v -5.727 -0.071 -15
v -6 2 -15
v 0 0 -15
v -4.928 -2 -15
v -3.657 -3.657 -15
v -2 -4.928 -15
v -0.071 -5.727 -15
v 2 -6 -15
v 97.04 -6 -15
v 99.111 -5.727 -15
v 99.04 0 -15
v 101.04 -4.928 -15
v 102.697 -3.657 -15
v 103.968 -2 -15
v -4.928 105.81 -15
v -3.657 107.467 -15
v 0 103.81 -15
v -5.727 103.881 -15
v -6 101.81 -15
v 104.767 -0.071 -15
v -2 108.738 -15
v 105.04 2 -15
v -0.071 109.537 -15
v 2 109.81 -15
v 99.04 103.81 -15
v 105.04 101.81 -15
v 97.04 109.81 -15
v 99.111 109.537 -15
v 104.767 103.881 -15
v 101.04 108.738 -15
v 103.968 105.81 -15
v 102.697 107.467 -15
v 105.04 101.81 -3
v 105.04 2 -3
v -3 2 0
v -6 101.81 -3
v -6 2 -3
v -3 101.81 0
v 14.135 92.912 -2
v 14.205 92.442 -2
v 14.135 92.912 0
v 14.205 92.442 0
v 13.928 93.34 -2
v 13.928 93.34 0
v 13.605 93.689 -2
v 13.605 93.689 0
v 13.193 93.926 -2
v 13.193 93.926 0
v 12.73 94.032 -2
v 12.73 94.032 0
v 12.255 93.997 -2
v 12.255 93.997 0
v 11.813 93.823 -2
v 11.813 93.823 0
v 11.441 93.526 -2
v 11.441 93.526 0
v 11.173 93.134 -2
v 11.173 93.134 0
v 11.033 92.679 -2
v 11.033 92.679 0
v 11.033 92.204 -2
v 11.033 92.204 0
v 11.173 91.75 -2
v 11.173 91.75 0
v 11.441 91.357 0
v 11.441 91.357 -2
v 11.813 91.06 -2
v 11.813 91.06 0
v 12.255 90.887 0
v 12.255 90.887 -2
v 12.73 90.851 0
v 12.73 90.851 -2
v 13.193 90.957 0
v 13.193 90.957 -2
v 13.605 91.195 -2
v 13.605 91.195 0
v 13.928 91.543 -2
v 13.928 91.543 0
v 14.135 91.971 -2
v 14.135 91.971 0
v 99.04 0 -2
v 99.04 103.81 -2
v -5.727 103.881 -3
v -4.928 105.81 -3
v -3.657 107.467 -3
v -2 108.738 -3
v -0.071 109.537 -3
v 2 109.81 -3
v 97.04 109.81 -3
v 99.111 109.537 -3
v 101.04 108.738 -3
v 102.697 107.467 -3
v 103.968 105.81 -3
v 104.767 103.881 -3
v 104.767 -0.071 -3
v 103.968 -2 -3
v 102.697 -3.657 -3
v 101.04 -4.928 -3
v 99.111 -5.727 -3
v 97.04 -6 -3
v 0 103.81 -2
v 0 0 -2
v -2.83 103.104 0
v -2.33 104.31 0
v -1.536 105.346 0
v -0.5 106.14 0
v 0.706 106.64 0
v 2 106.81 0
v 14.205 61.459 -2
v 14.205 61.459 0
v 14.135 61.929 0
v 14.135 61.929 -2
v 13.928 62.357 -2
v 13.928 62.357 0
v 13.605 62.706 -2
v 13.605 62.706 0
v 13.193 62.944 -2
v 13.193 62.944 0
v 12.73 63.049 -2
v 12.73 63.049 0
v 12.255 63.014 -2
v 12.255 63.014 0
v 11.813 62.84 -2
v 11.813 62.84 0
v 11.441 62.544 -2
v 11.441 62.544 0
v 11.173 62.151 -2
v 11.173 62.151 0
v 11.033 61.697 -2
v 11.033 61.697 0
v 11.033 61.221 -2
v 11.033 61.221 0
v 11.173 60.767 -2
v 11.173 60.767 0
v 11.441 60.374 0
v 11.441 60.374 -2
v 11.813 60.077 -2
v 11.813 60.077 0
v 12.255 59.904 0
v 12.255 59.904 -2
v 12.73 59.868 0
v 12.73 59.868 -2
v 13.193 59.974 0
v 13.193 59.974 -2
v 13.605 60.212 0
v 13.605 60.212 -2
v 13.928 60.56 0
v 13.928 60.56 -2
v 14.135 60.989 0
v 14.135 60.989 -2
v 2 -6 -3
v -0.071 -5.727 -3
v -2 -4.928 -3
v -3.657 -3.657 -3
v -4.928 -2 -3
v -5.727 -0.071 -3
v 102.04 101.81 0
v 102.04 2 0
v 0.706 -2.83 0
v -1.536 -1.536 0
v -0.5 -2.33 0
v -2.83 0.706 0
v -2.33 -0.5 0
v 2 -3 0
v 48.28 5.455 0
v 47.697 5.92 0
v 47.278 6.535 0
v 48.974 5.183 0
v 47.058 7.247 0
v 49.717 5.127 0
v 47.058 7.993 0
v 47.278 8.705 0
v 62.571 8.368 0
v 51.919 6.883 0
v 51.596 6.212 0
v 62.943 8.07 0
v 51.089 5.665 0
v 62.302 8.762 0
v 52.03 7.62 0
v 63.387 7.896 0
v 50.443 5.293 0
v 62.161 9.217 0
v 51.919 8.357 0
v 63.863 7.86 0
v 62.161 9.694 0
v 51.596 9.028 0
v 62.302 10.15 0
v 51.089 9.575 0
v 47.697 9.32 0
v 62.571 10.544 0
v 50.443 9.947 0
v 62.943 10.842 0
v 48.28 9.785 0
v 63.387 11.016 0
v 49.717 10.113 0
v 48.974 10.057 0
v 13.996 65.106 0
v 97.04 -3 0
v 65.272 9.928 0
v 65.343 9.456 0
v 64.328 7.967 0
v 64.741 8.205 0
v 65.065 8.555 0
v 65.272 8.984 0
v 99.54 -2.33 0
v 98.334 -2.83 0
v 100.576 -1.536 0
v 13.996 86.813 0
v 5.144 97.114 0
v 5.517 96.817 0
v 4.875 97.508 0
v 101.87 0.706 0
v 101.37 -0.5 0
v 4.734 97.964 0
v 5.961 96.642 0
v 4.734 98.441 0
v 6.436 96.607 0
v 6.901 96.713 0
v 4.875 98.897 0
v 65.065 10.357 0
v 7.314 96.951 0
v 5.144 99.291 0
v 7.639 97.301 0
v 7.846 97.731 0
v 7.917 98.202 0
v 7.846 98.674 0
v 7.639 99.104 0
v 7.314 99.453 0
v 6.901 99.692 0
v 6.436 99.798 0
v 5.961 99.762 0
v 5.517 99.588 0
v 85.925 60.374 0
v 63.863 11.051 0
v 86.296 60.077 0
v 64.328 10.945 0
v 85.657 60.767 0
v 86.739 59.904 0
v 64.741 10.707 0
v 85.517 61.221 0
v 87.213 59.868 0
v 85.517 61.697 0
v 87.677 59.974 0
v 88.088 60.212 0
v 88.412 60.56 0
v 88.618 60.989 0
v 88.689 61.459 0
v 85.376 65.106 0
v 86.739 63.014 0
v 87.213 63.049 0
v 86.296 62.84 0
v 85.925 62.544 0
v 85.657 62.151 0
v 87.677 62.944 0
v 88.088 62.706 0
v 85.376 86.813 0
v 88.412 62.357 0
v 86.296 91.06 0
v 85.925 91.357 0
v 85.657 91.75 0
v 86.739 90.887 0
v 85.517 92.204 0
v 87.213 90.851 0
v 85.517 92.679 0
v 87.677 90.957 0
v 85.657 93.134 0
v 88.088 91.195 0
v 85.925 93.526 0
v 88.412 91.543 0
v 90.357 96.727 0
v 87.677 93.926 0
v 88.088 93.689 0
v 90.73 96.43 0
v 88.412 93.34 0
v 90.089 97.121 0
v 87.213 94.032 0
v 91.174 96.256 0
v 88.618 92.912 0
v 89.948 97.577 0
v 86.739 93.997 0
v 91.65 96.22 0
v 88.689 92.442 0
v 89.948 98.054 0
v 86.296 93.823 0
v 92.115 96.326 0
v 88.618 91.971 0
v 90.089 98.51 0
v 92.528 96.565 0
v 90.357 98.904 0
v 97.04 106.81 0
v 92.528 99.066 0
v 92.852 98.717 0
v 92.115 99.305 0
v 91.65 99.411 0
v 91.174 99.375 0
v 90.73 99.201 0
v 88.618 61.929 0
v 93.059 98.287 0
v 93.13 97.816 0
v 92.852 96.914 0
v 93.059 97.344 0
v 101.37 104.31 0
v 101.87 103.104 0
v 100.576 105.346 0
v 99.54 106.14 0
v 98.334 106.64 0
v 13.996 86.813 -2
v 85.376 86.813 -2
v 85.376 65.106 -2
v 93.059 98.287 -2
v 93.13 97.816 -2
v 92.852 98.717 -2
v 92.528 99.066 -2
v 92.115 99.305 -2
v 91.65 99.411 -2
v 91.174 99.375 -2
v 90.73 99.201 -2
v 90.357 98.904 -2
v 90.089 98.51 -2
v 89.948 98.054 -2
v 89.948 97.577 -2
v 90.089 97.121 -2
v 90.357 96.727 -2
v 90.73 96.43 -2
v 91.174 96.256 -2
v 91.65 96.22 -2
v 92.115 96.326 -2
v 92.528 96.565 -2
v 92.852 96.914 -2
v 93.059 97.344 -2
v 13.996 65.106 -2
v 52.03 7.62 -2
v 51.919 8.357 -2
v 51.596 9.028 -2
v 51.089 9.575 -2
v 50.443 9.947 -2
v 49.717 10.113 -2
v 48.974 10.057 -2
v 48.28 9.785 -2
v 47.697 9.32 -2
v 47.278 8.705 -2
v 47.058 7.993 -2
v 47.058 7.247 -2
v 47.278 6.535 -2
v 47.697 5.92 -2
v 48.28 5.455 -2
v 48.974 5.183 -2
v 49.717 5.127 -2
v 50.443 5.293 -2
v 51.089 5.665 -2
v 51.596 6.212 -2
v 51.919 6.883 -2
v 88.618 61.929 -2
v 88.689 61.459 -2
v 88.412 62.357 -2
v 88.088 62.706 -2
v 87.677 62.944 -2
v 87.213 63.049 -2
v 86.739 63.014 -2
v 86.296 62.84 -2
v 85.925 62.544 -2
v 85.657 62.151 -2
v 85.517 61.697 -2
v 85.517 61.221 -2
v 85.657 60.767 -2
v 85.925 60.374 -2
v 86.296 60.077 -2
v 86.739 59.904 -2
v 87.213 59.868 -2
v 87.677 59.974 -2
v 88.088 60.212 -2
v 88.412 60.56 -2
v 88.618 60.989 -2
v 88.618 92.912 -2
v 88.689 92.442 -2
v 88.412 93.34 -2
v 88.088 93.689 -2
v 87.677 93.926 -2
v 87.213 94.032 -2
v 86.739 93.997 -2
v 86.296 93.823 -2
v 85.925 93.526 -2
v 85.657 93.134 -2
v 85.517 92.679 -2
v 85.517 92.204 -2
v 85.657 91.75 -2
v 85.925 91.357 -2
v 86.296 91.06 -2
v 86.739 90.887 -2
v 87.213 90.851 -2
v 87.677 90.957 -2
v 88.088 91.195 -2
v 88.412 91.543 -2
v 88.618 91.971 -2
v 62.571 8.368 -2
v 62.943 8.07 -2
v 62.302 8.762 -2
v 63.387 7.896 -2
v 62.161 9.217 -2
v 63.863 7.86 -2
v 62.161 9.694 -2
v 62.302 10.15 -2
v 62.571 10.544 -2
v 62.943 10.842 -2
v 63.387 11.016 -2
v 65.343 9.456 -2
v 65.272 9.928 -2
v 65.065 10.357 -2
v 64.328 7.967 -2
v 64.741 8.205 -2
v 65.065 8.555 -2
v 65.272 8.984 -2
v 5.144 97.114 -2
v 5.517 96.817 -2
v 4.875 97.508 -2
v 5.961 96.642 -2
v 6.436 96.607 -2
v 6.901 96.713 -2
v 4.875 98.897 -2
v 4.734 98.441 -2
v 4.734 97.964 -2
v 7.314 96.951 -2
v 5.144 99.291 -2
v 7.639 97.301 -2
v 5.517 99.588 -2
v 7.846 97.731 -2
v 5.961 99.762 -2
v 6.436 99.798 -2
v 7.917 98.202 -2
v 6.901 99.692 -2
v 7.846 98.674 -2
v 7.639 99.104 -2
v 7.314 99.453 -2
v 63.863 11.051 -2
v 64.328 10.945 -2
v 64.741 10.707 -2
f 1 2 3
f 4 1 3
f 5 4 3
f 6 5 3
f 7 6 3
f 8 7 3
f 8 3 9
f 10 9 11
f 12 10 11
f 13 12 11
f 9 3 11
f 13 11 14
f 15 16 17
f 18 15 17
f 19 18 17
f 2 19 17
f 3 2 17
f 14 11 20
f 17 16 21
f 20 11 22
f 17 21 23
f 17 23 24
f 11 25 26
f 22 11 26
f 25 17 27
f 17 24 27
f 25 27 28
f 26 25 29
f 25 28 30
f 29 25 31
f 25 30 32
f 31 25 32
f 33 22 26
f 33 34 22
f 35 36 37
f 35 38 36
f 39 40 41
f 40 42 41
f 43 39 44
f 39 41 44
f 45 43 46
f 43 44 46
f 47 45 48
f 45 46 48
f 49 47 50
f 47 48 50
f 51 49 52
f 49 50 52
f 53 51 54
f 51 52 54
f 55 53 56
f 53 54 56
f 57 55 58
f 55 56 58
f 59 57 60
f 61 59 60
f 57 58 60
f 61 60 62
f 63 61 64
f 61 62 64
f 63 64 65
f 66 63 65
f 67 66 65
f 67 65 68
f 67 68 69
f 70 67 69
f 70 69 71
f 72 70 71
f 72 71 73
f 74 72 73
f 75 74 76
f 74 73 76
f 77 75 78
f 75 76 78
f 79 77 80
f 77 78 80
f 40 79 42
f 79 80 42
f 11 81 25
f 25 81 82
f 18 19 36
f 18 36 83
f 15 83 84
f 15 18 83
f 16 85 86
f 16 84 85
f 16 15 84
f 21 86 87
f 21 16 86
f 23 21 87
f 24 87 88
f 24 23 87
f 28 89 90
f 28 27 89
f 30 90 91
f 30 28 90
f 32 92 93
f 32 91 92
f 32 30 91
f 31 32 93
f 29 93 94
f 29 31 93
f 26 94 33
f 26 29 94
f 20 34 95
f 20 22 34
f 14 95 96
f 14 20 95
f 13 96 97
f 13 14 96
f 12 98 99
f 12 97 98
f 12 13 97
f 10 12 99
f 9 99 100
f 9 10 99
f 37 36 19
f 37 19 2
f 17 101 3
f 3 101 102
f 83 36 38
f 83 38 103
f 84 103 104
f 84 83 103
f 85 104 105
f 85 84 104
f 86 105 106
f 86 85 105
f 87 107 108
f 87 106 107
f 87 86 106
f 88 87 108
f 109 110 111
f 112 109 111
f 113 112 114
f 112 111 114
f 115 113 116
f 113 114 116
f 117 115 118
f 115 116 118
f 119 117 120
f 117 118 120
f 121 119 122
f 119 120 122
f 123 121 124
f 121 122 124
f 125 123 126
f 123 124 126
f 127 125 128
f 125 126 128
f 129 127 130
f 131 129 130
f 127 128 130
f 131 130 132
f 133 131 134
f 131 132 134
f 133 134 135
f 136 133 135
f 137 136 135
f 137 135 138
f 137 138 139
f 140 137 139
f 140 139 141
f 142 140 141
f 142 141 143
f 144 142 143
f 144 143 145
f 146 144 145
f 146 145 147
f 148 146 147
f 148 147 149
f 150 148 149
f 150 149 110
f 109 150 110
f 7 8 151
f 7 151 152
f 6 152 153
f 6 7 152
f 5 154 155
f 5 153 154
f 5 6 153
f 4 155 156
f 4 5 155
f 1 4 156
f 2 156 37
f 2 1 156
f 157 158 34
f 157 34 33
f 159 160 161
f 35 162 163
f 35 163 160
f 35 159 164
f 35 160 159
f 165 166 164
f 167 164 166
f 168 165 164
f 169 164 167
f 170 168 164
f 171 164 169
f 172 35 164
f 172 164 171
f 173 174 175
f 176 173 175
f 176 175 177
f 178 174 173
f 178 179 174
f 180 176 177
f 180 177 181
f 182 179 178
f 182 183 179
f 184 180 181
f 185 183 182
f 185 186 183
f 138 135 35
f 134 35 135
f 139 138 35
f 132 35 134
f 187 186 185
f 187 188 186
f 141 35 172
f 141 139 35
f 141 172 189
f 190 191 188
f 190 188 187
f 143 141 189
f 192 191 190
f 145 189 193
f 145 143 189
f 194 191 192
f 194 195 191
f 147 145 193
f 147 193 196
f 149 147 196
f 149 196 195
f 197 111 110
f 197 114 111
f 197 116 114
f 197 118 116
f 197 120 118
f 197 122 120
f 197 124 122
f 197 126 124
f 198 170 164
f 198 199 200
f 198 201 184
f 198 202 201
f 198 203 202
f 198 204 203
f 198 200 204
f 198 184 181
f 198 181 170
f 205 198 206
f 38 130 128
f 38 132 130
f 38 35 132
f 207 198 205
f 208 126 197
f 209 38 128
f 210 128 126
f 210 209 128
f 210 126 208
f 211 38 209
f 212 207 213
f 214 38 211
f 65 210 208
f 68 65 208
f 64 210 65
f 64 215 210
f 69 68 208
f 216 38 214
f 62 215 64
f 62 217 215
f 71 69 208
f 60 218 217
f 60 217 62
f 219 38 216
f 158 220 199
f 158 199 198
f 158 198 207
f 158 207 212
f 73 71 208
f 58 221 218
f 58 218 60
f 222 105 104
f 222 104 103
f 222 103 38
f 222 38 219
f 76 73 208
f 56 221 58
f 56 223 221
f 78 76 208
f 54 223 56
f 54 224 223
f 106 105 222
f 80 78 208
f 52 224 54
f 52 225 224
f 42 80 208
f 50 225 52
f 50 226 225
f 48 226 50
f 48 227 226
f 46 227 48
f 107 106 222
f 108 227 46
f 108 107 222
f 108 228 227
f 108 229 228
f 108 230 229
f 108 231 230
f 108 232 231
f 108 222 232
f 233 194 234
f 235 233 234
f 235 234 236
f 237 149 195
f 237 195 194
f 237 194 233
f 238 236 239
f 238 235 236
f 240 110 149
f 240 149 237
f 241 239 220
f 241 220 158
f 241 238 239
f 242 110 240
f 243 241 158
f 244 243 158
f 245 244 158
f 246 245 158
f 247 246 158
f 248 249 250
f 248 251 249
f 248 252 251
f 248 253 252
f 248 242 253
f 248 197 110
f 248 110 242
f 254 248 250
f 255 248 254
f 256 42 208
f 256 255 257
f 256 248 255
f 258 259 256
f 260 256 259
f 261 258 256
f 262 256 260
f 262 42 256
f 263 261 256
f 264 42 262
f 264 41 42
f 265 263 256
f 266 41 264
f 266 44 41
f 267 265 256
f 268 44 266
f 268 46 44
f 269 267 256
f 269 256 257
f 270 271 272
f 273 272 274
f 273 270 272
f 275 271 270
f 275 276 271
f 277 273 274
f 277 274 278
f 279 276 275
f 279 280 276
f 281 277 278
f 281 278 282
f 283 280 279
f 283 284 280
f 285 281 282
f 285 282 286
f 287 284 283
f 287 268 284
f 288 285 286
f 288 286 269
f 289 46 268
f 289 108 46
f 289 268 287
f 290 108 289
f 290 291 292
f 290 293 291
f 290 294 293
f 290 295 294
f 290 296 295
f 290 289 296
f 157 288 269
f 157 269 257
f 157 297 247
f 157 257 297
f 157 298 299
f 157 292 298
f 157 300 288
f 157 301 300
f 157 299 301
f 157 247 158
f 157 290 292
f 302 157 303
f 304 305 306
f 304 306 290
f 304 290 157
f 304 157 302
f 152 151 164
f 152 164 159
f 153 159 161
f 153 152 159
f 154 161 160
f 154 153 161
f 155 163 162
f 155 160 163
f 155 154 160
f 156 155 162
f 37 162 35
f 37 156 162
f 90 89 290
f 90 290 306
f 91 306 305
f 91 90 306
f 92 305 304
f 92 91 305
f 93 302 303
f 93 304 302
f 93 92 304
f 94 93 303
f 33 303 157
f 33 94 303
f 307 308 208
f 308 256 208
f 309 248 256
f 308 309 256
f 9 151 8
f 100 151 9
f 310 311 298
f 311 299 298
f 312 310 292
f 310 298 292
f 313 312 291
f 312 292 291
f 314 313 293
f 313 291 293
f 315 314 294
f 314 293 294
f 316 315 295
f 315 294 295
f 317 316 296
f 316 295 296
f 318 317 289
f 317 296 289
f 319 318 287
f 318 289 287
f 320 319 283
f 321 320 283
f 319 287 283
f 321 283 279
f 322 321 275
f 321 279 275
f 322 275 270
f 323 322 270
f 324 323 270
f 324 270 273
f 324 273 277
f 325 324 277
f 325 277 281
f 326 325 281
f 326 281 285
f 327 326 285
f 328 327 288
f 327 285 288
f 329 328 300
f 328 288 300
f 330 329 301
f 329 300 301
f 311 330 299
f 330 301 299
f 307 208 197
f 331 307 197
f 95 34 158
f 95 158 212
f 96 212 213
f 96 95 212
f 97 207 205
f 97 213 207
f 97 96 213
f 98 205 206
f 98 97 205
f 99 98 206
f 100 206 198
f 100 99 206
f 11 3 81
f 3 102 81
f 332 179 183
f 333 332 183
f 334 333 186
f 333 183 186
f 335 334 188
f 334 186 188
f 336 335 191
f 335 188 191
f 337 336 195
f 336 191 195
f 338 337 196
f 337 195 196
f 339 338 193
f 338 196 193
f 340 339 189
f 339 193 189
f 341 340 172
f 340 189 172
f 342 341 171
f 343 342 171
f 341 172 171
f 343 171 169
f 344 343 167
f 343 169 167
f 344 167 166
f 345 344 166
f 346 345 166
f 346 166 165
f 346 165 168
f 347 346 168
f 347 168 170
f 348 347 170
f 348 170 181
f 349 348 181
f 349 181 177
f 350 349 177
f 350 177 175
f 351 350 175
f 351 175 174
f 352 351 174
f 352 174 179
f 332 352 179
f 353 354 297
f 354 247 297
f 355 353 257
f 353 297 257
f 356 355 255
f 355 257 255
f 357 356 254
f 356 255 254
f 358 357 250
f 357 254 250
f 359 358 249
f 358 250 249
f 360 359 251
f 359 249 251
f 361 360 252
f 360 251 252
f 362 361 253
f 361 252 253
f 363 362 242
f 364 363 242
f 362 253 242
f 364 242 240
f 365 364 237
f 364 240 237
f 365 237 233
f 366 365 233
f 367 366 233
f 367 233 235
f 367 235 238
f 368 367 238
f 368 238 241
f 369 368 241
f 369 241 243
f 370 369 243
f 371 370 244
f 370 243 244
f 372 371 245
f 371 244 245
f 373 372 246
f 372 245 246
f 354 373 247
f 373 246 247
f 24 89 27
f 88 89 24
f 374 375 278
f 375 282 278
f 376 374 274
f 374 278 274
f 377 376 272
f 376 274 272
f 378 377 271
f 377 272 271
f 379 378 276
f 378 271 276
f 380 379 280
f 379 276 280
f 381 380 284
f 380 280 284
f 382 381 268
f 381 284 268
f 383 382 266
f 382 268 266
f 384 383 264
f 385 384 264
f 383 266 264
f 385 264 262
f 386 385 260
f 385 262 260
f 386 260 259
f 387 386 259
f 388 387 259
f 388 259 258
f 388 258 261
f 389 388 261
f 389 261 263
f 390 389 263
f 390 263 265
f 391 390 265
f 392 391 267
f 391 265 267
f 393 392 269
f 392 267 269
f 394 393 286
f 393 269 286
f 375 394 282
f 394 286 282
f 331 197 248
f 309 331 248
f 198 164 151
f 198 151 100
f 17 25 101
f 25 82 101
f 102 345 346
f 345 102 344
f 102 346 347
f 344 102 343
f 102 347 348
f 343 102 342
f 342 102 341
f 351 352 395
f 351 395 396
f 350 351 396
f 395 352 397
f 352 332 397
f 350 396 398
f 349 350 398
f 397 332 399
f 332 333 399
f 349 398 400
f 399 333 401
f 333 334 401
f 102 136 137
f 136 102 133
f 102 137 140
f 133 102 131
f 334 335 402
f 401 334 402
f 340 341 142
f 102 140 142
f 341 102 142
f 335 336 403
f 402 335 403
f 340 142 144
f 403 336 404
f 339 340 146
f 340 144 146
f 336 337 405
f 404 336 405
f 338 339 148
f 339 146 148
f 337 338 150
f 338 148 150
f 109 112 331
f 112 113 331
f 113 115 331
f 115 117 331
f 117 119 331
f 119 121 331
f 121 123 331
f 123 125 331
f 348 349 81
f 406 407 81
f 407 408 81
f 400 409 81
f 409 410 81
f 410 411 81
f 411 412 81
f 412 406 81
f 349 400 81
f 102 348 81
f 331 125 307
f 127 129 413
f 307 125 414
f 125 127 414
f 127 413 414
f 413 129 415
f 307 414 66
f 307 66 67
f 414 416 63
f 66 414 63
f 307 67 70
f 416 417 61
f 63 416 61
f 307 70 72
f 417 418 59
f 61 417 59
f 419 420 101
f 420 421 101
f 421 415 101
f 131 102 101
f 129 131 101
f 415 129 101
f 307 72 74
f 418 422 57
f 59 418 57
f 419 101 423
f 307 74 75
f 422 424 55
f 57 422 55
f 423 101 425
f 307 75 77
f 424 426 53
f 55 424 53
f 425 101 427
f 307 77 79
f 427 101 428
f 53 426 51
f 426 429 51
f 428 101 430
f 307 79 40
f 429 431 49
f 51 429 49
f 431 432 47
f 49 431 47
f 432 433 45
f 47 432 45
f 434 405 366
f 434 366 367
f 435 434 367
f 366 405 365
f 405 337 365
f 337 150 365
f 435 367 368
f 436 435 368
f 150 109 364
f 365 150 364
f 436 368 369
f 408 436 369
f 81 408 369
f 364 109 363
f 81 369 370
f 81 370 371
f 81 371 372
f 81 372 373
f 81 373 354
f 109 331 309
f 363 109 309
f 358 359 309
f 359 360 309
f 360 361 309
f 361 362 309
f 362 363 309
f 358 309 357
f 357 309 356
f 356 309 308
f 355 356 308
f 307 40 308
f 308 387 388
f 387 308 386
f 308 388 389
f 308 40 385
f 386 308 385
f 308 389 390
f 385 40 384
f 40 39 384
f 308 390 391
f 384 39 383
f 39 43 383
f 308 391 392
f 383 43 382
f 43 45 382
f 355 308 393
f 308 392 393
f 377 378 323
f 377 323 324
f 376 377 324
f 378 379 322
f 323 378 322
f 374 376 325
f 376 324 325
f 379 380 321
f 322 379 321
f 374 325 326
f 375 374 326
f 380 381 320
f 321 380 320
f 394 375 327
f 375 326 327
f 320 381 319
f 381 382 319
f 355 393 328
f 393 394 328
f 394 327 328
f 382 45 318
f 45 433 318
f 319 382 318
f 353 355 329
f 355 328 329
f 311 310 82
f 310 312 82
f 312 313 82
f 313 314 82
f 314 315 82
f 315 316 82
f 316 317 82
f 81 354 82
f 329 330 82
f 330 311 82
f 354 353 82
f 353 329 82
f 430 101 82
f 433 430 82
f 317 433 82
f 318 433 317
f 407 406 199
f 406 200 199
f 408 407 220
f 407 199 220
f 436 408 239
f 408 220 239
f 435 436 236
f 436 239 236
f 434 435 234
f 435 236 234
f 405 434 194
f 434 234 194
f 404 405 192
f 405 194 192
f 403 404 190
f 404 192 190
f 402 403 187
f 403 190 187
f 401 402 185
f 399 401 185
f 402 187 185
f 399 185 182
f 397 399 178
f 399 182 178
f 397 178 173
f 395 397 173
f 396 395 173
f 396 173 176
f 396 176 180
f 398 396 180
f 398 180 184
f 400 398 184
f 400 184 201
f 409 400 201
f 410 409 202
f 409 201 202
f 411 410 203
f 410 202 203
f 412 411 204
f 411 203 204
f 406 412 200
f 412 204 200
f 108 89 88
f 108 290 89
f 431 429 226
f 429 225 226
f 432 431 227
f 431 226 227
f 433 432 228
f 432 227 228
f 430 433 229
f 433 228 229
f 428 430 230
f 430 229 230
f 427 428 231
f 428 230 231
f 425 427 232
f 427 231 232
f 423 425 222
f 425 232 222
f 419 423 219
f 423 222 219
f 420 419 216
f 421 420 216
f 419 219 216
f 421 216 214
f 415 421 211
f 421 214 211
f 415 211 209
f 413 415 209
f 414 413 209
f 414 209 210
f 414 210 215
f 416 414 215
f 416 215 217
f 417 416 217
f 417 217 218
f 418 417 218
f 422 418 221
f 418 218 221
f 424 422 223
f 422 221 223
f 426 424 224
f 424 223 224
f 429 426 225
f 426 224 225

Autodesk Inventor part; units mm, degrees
ref_plane "YZ Plane" through (0, 0, 0) normal (1, 0, 0) x (0, 1, 0)
ref_plane "XZ Plane" through (0, 0, 0) normal (0, 1, 0) x (-1, 0, 0)
ref_plane "XY Plane" through (0, 0, 0) normal (0, 0, 1) x (1, 0, 0)
sketch "Sketch1" plane through (0, 0, 0) normal (0, 0, 1) x (1, 0, 0)
  line L0 (0, 103.81) -> (0, 0)
  line L1 (99.04, 103.81) -> (0, 103.81)
  line L2 (99.04, 0) -> (99.04, 103.81)
  circle A0 centre (91.5302, 97.8155) radius 1.6
  circle A1 centre (6.3166, 98.2023) radius 1.6
  circle A2 centre (63.7434, 9.4559) radius 1.6
  line L3 (-2.8877, 39.67) -> (-2.8877, 25.07)
  line L4 (18.04, 39.67) -> (-2.8877, 39.67)
  line L5 (-2.8877, 25.07) -> (18.04, 25.07)
  line L6 (5.99, 20.97) -> (-0.5, 20.97)
  line L7 (-0.5, 20.97) -> (-0.5, 9.286)
  line L8 (-0.5, 9.286) -> (5.99, 9.286)
  line L9 (5.99, 9.286) -> (5.99, 20.97)
  line L10 (18.04, 25.07) -> (18.04, 39.67)
  line L11 (0, 0) -> (99.04, 0)
  line L12 (-2, 105.81) -> (-2, -2)
  line L13 (-2, -2) -> (101.04, -2)
  line L14 (101.04, -2) -> (101.04, 105.81)
  line L15 (101.04, 105.81) -> (-2, 105.81)
  line L16 (-6, 109.81) -> (-6, -6)
  line L17 (-6, -6) -> (105.04, -6)
  line L18 (105.04, -6) -> (105.04, 109.81)
  line L19 (105.04, 109.81) -> (-6, 109.81)
  circle A3 centre (49.53, 7.62) radius 1.55
  point P0 (0, 20.97)
  point P1 (0, 9.286)
  dimension "d0" = 2
  dimension "d1" = 4
extrude "Extrusion3" add sketch "Sketch1" against normal blind 15 contours L0 L4 L12 L15 L14 L13 L5 L6 L7 L8 L11 L2 L1 | L0 L5 L12 L4 | L12 L5 L3 L4 | L0 L8 L7 L6 | L19 L18 L17 L16
extrude "Extrusion4" add sketch "Sketch1" against normal blind 2 contours L1 L2 L11 L0 L8 L9 L6 L5 L10 L4 | L4 L10 L5 L0 | L6 L9 L8 L0 | A3
fillet "Fillet2" radius 8 4 edges at (105.04, -6, -7.5) (-6, -6, -7.5) (-6, 109.81, -7.5) (105.04, 109.81, -7.5)
chamfer "Chamfer2" distance 3 angle 45 8 edges at (-6, 51.905, 0) (-3.6569, -3.6569, 0) (49.52, -6, 0) (102.6969, -3.6569, 0) (105.04, 51.905, 0) (102.6969, 107.4669, 0) (49.52, 109.81, 0) (-3.6569, 107.4669, 0)
sketch "Sketch2" plane through (0, 0, 0) normal (0, 0, 1) x (1, 0, 0)
  circle A0 centre (49.53, 7.62) radius 1.55 projected
  circle A1 centre (49.53, 7.62) radius 2.5
  point P0 (0, 0)
  dimension "d18" = 5
extrude "Extrusion5" cut sketch "Sketch2" against normal blind 2 contours A0 | A1
sketch "Sketch3" plane through (0, 0, 0) normal (0, 0, 1) x (1, 0, 0)
  line L0 (9.9957, 94.7225) -> (9.9957, 59.1825)
  line L1 (9.9957, 59.1825) -> (90.0757, 59.1825)
  line L2 (90.0757, 59.1825) -> (90.0757, 94.7225)
  line L3 (90.0757, 94.7225) -> (9.9957, 94.7225)
  circle A0 centre (12.6104, 92.4416) radius 1.595
  circle A1 centre (87.094, 61.4588) radius 1.595
  line L4 (13.9957, 86.8134) -> (13.9957, 65.1061)
  line L5 (85.3757, 86.8134) -> (13.9957, 86.8134)
  line L6 (85.3757, 65.1061) -> (85.3757, 86.8134)
  line L7 (13.9957, 65.1061) -> (85.3757, 65.1061)
  circle A2 centre (87.094, 92.4416) radius 1.595
  circle A3 centre (12.6104, 61.4588) radius 1.595
  line L8 (49.6857, 86.8134) -> (49.6857, 75.9598)
  line L9 (2, 106.81) -> (97.04, 106.81) projected
  point P0 (0, 0)
  point P1 (55.3023, 77.61)
extrude "Extrusion6" cut sketch "Sketch3" against normal blind 2 contours A0 | A1 | L5 L6 L7 L4 | A2 | A3
properties part number "Tampa"
